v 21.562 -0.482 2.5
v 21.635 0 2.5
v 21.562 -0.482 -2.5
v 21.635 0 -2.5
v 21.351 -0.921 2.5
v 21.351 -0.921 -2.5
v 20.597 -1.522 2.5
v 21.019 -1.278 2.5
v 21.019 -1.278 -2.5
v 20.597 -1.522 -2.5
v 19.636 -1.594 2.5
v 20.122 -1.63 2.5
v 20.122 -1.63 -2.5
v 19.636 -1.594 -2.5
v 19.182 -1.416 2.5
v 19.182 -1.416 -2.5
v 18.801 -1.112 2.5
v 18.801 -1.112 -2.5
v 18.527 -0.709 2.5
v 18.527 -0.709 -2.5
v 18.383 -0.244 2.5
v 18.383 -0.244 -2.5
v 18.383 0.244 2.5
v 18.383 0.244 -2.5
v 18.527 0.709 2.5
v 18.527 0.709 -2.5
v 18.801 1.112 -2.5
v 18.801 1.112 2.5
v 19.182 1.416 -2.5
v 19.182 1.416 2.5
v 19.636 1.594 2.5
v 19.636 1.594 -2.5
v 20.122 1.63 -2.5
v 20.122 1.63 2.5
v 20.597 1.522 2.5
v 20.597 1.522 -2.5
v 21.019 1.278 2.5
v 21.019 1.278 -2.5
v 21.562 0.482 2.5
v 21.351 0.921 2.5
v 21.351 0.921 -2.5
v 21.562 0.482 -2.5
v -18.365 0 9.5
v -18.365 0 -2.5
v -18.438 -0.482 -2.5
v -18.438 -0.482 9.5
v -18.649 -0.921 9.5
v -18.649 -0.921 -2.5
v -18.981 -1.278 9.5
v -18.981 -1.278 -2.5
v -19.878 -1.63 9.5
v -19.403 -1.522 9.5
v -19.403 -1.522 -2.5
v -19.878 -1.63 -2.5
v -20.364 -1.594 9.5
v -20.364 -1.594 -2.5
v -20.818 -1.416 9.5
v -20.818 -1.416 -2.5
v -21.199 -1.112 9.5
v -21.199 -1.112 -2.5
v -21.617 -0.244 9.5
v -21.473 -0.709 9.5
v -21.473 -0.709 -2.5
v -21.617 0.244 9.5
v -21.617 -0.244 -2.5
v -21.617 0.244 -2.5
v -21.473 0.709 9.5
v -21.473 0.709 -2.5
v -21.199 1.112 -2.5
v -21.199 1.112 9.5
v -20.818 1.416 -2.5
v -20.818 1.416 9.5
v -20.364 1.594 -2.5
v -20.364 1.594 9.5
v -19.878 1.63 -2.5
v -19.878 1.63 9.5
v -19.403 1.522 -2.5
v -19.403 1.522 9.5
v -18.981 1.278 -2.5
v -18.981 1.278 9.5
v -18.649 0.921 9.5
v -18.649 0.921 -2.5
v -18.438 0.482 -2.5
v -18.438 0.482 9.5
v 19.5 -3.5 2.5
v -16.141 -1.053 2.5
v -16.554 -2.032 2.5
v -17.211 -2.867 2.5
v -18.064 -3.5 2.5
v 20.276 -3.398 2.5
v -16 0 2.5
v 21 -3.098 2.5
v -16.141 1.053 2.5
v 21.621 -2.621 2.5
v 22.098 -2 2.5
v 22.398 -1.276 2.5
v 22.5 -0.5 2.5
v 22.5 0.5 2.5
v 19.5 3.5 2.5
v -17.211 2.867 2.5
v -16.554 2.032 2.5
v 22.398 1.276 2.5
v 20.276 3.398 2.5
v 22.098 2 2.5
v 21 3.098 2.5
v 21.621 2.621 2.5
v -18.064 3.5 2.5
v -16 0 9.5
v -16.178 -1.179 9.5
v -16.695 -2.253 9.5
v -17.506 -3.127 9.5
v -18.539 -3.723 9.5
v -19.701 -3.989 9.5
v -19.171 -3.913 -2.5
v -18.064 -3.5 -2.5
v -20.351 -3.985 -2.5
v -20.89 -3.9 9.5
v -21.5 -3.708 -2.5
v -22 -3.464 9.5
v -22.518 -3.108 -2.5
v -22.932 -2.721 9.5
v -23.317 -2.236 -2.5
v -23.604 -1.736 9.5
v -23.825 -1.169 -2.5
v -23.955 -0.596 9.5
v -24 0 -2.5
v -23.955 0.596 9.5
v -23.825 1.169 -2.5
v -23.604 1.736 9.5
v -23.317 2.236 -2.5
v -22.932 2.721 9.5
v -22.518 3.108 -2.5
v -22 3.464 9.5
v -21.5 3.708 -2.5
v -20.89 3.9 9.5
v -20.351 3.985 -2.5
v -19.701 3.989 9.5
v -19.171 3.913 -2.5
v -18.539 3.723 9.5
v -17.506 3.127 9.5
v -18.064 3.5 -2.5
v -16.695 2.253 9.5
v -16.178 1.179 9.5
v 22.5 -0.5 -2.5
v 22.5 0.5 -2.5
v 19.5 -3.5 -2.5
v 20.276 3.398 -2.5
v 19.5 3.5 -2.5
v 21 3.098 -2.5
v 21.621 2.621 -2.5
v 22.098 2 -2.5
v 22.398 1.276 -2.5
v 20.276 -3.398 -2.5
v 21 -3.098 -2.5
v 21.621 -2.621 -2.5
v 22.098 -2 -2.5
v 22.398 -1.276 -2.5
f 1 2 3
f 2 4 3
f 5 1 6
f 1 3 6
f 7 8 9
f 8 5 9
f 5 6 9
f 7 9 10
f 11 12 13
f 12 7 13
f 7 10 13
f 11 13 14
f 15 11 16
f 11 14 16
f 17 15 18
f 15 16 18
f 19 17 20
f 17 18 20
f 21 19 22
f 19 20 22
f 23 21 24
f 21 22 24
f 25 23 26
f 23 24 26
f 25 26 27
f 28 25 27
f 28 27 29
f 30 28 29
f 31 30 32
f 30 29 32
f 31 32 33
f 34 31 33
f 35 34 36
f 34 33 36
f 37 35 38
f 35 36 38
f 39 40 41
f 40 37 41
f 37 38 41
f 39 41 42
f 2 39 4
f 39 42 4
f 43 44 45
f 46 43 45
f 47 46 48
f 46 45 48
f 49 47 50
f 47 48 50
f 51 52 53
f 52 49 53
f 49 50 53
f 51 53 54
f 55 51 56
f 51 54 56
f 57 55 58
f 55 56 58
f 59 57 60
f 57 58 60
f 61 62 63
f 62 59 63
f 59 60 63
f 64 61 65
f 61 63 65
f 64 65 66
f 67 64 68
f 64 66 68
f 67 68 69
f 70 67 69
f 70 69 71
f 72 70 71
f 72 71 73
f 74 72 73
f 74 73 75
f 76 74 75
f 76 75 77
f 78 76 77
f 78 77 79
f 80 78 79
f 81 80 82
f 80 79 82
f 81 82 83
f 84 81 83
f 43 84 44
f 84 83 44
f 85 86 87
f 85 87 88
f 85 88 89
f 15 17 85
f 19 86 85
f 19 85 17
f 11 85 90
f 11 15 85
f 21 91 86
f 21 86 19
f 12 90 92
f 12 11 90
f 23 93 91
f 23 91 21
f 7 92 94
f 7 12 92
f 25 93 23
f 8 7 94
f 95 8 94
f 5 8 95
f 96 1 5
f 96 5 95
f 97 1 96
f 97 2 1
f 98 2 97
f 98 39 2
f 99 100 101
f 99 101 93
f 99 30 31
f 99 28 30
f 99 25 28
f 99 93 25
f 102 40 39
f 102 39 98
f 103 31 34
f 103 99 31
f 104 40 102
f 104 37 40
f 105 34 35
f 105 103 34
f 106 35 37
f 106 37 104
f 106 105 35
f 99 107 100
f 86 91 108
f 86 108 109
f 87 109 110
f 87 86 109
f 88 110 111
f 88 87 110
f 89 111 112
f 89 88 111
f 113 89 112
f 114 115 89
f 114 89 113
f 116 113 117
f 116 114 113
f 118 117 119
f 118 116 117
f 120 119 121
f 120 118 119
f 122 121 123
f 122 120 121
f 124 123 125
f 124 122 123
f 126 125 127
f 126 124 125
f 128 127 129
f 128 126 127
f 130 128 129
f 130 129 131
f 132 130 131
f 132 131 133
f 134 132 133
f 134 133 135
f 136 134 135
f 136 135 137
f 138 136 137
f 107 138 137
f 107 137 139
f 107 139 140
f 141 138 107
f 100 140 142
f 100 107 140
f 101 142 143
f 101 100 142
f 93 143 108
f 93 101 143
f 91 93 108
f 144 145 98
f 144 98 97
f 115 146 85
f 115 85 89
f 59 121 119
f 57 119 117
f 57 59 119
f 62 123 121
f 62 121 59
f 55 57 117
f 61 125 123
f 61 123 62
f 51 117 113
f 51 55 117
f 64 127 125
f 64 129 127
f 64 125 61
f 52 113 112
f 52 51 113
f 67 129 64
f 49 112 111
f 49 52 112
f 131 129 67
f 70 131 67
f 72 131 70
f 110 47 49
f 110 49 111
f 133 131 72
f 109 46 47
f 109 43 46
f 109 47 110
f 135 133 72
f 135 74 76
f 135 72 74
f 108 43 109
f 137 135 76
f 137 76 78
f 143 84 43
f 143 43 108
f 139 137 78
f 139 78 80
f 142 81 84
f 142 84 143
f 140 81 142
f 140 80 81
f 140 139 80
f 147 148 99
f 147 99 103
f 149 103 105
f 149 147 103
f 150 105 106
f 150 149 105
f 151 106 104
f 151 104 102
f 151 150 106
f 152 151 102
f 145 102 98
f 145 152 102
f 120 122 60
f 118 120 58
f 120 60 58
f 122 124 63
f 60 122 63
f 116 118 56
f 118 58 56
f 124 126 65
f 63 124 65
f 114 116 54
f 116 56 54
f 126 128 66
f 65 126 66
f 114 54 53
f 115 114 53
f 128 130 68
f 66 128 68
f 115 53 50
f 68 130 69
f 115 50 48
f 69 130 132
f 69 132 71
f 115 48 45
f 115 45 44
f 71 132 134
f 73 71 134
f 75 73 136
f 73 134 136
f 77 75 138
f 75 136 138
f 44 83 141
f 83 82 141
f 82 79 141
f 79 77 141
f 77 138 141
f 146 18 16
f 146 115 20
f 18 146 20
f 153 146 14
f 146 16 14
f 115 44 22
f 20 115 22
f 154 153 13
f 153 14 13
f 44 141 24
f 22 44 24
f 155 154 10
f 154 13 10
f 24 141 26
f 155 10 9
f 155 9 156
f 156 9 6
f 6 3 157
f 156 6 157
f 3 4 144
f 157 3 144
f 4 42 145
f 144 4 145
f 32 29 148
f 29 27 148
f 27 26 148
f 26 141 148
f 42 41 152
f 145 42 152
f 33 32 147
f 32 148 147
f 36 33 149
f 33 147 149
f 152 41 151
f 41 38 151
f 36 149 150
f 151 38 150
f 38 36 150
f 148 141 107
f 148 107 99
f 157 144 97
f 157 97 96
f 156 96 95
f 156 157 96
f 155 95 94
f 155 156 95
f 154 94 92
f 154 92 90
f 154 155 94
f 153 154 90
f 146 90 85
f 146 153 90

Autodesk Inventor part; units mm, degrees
ref_plane "YZ Plane" through (0, 0, 0) normal (1, 0, 0) x (0, 1, 0)
ref_plane "XZ Plane" through (0, 0, 0) normal (0, 1, 0) x (-1, 0, 0)
ref_plane "XY Plane" through (0, 0, 0) normal (0, 0, 1) x (1, 0, 0)
sketch "スケッチ1" plane through (0, 0, 0) normal (0, 0, 1) x (1, 0, 0)
  line L0 (-22.5, 3.5) -> (22.5, 3.5)
  line L1 (22.5, 3.5) -> (22.5, -3.5)
  line L2 (22.5, -3.5) -> (-22.5, -3.5)
  line L3 (-22.5, -3.5) -> (-22.5, 3.5)
  line L4 (-22.5, 3.5) -> (22.5, -3.5) construction
  line L5 (22.5, 3.5) -> (-22.5, -3.5) construction
  line L6 (0, -11.2) -> (0, 11.2) construction
  line L7 (-38.51, 0) -> (35.06, 0) construction
  circle A0 centre (-20, 0) radius 4.55
  line L8 (22.5, -3.5) -> (22.5, 3.5)
  circle A1 centre (20, 0) radius 4.55
  circle A2 centre (20, 0) radius 1.635
  circle A3 centre (-20, 0) radius 1.635
  circle A4 centre (-20, 0) radius 4
  line L9 (-20, 4) -> (-20, -4) construction
  circle A5 centre (-20, 6) radius 2
  circle A6 centre (-20, -6) radius 2
  circle A7 centre (-20, 0) radius 4
  circle A8 centre (-20, 0) radius 8
  point P0 (0, 0)
  point P1 (-17.0927, 3.5)
  point P2 (-22.9073, 3.5)
  point P3 (-22.9073, -3.5)
  point P4 (-17.0927, -3.5)
  point P5 (17.0927, 3.5)
  point P6 (17.0927, -3.5)
  point P7 (22.9073, -3.5)
  point P8 (22.9073, 3.5)
  dimension "d1" = 7
  dimension "d2" = 20
  dimension "d3" = 45
  dimension "d4" = 9.1
  dimension "d13" = 3.27
  dimension "d14" = 3.27
  dimension "d15" = 8
  dimension "d16" = 4
  dimension "d17" = 4
  dimension "d18" = 12
extrude "押し出し1" add sketch "スケッチ1" along normal mid plane 5 contours L0 A4 L3 | L0 A4 L2 L3 | L0 A0 L2 A4 | A4 L2 L3 | L0 A8 L2 A0 | L0 A1 L2 A8 | L0 L1 L2 A1 picked at (19.7985, -2.8744)
fillet "フィレット1" radius 3 4 edges at (-22.5, 3.5, 0) (-22.5, -3.5, 0) (22.5, -3.5, 0) (22.5, 3.5, 0)
extrude "押し出し3" add sketch "スケッチ1" along normal blind 12 from surface at -2.5 contours A4 L0 | L0 A4 L2 L3 | L3 A4 | L2 A4
properties part number "link_arm_1"
